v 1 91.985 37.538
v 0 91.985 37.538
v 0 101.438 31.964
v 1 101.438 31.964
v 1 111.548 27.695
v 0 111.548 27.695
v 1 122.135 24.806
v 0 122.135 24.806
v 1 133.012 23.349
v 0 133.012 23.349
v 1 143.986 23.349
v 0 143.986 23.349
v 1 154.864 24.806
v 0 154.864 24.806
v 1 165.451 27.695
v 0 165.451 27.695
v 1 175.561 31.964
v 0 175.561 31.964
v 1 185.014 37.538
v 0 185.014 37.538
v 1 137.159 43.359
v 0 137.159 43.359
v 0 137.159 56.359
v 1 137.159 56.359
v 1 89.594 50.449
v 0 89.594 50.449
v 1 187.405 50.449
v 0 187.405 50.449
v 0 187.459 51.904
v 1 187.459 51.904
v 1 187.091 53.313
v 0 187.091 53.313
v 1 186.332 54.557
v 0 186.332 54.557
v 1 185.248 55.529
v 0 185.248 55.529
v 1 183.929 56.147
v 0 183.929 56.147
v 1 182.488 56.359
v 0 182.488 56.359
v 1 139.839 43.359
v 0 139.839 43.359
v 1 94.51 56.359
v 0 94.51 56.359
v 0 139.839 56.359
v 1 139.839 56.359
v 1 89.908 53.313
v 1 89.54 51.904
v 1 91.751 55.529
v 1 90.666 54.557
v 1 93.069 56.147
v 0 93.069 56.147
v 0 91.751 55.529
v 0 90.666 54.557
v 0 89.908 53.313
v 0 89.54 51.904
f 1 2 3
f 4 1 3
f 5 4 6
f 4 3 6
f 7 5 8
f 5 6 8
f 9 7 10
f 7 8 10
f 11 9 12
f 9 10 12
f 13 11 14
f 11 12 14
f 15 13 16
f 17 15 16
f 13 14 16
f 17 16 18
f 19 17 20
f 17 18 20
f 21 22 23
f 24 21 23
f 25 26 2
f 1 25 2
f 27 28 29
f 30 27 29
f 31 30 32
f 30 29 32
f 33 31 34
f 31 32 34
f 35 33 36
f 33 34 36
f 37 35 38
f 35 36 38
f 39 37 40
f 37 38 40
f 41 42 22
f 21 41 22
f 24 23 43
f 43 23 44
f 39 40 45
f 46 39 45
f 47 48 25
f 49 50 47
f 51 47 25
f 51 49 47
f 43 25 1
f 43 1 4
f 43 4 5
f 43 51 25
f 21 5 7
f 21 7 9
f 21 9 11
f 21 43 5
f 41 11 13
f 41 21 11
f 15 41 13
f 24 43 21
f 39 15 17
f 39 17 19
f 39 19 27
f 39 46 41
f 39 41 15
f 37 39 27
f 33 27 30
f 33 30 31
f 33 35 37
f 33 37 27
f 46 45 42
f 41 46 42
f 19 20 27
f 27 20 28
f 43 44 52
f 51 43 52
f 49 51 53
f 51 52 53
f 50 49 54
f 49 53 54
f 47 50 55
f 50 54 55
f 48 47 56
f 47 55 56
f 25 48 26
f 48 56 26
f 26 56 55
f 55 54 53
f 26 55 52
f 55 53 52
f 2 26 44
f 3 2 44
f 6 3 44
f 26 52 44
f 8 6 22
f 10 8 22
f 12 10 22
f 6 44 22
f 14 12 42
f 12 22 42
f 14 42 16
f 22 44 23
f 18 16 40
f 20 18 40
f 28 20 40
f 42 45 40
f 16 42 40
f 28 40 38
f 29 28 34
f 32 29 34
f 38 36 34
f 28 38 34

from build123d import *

# Parameters (mm, degrees)
F1_DEPTH = 1


# Not quite as in the source:
# - ends of sketch curves that miss each other by under 0.0002 mm in the source are joined


with BuildPart() as f1:
    # F0 (on Right) → F1 (new body)
    with BuildSketch(Plane.YZ):
        with BuildLine():
            Line((137.159267, 56.359386), (94.510204, 56.359386))
            ThreePointArc((94.510204, 56.359386), (90.6662324271, 54.5568666562), (89.5937941011, 50.4489390187))
            Line((89.5937941011, 50.4489390187), (91.984617, 37.538493))
            ThreePointArc((91.984617, 37.538493), (138.4992665872, 23.165856), (185.0139164157, 37.5384923916))
            Line((185.0139164157, 37.5384923916), (187.40474, 50.448939))
            ThreePointArc((187.40474, 50.448939), (186.3323015729, 54.5568666562), (182.48833, 56.359386))
            Line((182.48833, 56.359386), (139.839267, 56.359386))
            Line((139.839267, 56.359386), (139.839267, 43.359386))
            Line((139.839267, 43.359386), (137.159267, 43.359386))
            Line((137.159267, 43.359386), (137.159267, 56.359386))
        make_face()
    extrude(amount=F1_DEPTH)


solid = f1.part
